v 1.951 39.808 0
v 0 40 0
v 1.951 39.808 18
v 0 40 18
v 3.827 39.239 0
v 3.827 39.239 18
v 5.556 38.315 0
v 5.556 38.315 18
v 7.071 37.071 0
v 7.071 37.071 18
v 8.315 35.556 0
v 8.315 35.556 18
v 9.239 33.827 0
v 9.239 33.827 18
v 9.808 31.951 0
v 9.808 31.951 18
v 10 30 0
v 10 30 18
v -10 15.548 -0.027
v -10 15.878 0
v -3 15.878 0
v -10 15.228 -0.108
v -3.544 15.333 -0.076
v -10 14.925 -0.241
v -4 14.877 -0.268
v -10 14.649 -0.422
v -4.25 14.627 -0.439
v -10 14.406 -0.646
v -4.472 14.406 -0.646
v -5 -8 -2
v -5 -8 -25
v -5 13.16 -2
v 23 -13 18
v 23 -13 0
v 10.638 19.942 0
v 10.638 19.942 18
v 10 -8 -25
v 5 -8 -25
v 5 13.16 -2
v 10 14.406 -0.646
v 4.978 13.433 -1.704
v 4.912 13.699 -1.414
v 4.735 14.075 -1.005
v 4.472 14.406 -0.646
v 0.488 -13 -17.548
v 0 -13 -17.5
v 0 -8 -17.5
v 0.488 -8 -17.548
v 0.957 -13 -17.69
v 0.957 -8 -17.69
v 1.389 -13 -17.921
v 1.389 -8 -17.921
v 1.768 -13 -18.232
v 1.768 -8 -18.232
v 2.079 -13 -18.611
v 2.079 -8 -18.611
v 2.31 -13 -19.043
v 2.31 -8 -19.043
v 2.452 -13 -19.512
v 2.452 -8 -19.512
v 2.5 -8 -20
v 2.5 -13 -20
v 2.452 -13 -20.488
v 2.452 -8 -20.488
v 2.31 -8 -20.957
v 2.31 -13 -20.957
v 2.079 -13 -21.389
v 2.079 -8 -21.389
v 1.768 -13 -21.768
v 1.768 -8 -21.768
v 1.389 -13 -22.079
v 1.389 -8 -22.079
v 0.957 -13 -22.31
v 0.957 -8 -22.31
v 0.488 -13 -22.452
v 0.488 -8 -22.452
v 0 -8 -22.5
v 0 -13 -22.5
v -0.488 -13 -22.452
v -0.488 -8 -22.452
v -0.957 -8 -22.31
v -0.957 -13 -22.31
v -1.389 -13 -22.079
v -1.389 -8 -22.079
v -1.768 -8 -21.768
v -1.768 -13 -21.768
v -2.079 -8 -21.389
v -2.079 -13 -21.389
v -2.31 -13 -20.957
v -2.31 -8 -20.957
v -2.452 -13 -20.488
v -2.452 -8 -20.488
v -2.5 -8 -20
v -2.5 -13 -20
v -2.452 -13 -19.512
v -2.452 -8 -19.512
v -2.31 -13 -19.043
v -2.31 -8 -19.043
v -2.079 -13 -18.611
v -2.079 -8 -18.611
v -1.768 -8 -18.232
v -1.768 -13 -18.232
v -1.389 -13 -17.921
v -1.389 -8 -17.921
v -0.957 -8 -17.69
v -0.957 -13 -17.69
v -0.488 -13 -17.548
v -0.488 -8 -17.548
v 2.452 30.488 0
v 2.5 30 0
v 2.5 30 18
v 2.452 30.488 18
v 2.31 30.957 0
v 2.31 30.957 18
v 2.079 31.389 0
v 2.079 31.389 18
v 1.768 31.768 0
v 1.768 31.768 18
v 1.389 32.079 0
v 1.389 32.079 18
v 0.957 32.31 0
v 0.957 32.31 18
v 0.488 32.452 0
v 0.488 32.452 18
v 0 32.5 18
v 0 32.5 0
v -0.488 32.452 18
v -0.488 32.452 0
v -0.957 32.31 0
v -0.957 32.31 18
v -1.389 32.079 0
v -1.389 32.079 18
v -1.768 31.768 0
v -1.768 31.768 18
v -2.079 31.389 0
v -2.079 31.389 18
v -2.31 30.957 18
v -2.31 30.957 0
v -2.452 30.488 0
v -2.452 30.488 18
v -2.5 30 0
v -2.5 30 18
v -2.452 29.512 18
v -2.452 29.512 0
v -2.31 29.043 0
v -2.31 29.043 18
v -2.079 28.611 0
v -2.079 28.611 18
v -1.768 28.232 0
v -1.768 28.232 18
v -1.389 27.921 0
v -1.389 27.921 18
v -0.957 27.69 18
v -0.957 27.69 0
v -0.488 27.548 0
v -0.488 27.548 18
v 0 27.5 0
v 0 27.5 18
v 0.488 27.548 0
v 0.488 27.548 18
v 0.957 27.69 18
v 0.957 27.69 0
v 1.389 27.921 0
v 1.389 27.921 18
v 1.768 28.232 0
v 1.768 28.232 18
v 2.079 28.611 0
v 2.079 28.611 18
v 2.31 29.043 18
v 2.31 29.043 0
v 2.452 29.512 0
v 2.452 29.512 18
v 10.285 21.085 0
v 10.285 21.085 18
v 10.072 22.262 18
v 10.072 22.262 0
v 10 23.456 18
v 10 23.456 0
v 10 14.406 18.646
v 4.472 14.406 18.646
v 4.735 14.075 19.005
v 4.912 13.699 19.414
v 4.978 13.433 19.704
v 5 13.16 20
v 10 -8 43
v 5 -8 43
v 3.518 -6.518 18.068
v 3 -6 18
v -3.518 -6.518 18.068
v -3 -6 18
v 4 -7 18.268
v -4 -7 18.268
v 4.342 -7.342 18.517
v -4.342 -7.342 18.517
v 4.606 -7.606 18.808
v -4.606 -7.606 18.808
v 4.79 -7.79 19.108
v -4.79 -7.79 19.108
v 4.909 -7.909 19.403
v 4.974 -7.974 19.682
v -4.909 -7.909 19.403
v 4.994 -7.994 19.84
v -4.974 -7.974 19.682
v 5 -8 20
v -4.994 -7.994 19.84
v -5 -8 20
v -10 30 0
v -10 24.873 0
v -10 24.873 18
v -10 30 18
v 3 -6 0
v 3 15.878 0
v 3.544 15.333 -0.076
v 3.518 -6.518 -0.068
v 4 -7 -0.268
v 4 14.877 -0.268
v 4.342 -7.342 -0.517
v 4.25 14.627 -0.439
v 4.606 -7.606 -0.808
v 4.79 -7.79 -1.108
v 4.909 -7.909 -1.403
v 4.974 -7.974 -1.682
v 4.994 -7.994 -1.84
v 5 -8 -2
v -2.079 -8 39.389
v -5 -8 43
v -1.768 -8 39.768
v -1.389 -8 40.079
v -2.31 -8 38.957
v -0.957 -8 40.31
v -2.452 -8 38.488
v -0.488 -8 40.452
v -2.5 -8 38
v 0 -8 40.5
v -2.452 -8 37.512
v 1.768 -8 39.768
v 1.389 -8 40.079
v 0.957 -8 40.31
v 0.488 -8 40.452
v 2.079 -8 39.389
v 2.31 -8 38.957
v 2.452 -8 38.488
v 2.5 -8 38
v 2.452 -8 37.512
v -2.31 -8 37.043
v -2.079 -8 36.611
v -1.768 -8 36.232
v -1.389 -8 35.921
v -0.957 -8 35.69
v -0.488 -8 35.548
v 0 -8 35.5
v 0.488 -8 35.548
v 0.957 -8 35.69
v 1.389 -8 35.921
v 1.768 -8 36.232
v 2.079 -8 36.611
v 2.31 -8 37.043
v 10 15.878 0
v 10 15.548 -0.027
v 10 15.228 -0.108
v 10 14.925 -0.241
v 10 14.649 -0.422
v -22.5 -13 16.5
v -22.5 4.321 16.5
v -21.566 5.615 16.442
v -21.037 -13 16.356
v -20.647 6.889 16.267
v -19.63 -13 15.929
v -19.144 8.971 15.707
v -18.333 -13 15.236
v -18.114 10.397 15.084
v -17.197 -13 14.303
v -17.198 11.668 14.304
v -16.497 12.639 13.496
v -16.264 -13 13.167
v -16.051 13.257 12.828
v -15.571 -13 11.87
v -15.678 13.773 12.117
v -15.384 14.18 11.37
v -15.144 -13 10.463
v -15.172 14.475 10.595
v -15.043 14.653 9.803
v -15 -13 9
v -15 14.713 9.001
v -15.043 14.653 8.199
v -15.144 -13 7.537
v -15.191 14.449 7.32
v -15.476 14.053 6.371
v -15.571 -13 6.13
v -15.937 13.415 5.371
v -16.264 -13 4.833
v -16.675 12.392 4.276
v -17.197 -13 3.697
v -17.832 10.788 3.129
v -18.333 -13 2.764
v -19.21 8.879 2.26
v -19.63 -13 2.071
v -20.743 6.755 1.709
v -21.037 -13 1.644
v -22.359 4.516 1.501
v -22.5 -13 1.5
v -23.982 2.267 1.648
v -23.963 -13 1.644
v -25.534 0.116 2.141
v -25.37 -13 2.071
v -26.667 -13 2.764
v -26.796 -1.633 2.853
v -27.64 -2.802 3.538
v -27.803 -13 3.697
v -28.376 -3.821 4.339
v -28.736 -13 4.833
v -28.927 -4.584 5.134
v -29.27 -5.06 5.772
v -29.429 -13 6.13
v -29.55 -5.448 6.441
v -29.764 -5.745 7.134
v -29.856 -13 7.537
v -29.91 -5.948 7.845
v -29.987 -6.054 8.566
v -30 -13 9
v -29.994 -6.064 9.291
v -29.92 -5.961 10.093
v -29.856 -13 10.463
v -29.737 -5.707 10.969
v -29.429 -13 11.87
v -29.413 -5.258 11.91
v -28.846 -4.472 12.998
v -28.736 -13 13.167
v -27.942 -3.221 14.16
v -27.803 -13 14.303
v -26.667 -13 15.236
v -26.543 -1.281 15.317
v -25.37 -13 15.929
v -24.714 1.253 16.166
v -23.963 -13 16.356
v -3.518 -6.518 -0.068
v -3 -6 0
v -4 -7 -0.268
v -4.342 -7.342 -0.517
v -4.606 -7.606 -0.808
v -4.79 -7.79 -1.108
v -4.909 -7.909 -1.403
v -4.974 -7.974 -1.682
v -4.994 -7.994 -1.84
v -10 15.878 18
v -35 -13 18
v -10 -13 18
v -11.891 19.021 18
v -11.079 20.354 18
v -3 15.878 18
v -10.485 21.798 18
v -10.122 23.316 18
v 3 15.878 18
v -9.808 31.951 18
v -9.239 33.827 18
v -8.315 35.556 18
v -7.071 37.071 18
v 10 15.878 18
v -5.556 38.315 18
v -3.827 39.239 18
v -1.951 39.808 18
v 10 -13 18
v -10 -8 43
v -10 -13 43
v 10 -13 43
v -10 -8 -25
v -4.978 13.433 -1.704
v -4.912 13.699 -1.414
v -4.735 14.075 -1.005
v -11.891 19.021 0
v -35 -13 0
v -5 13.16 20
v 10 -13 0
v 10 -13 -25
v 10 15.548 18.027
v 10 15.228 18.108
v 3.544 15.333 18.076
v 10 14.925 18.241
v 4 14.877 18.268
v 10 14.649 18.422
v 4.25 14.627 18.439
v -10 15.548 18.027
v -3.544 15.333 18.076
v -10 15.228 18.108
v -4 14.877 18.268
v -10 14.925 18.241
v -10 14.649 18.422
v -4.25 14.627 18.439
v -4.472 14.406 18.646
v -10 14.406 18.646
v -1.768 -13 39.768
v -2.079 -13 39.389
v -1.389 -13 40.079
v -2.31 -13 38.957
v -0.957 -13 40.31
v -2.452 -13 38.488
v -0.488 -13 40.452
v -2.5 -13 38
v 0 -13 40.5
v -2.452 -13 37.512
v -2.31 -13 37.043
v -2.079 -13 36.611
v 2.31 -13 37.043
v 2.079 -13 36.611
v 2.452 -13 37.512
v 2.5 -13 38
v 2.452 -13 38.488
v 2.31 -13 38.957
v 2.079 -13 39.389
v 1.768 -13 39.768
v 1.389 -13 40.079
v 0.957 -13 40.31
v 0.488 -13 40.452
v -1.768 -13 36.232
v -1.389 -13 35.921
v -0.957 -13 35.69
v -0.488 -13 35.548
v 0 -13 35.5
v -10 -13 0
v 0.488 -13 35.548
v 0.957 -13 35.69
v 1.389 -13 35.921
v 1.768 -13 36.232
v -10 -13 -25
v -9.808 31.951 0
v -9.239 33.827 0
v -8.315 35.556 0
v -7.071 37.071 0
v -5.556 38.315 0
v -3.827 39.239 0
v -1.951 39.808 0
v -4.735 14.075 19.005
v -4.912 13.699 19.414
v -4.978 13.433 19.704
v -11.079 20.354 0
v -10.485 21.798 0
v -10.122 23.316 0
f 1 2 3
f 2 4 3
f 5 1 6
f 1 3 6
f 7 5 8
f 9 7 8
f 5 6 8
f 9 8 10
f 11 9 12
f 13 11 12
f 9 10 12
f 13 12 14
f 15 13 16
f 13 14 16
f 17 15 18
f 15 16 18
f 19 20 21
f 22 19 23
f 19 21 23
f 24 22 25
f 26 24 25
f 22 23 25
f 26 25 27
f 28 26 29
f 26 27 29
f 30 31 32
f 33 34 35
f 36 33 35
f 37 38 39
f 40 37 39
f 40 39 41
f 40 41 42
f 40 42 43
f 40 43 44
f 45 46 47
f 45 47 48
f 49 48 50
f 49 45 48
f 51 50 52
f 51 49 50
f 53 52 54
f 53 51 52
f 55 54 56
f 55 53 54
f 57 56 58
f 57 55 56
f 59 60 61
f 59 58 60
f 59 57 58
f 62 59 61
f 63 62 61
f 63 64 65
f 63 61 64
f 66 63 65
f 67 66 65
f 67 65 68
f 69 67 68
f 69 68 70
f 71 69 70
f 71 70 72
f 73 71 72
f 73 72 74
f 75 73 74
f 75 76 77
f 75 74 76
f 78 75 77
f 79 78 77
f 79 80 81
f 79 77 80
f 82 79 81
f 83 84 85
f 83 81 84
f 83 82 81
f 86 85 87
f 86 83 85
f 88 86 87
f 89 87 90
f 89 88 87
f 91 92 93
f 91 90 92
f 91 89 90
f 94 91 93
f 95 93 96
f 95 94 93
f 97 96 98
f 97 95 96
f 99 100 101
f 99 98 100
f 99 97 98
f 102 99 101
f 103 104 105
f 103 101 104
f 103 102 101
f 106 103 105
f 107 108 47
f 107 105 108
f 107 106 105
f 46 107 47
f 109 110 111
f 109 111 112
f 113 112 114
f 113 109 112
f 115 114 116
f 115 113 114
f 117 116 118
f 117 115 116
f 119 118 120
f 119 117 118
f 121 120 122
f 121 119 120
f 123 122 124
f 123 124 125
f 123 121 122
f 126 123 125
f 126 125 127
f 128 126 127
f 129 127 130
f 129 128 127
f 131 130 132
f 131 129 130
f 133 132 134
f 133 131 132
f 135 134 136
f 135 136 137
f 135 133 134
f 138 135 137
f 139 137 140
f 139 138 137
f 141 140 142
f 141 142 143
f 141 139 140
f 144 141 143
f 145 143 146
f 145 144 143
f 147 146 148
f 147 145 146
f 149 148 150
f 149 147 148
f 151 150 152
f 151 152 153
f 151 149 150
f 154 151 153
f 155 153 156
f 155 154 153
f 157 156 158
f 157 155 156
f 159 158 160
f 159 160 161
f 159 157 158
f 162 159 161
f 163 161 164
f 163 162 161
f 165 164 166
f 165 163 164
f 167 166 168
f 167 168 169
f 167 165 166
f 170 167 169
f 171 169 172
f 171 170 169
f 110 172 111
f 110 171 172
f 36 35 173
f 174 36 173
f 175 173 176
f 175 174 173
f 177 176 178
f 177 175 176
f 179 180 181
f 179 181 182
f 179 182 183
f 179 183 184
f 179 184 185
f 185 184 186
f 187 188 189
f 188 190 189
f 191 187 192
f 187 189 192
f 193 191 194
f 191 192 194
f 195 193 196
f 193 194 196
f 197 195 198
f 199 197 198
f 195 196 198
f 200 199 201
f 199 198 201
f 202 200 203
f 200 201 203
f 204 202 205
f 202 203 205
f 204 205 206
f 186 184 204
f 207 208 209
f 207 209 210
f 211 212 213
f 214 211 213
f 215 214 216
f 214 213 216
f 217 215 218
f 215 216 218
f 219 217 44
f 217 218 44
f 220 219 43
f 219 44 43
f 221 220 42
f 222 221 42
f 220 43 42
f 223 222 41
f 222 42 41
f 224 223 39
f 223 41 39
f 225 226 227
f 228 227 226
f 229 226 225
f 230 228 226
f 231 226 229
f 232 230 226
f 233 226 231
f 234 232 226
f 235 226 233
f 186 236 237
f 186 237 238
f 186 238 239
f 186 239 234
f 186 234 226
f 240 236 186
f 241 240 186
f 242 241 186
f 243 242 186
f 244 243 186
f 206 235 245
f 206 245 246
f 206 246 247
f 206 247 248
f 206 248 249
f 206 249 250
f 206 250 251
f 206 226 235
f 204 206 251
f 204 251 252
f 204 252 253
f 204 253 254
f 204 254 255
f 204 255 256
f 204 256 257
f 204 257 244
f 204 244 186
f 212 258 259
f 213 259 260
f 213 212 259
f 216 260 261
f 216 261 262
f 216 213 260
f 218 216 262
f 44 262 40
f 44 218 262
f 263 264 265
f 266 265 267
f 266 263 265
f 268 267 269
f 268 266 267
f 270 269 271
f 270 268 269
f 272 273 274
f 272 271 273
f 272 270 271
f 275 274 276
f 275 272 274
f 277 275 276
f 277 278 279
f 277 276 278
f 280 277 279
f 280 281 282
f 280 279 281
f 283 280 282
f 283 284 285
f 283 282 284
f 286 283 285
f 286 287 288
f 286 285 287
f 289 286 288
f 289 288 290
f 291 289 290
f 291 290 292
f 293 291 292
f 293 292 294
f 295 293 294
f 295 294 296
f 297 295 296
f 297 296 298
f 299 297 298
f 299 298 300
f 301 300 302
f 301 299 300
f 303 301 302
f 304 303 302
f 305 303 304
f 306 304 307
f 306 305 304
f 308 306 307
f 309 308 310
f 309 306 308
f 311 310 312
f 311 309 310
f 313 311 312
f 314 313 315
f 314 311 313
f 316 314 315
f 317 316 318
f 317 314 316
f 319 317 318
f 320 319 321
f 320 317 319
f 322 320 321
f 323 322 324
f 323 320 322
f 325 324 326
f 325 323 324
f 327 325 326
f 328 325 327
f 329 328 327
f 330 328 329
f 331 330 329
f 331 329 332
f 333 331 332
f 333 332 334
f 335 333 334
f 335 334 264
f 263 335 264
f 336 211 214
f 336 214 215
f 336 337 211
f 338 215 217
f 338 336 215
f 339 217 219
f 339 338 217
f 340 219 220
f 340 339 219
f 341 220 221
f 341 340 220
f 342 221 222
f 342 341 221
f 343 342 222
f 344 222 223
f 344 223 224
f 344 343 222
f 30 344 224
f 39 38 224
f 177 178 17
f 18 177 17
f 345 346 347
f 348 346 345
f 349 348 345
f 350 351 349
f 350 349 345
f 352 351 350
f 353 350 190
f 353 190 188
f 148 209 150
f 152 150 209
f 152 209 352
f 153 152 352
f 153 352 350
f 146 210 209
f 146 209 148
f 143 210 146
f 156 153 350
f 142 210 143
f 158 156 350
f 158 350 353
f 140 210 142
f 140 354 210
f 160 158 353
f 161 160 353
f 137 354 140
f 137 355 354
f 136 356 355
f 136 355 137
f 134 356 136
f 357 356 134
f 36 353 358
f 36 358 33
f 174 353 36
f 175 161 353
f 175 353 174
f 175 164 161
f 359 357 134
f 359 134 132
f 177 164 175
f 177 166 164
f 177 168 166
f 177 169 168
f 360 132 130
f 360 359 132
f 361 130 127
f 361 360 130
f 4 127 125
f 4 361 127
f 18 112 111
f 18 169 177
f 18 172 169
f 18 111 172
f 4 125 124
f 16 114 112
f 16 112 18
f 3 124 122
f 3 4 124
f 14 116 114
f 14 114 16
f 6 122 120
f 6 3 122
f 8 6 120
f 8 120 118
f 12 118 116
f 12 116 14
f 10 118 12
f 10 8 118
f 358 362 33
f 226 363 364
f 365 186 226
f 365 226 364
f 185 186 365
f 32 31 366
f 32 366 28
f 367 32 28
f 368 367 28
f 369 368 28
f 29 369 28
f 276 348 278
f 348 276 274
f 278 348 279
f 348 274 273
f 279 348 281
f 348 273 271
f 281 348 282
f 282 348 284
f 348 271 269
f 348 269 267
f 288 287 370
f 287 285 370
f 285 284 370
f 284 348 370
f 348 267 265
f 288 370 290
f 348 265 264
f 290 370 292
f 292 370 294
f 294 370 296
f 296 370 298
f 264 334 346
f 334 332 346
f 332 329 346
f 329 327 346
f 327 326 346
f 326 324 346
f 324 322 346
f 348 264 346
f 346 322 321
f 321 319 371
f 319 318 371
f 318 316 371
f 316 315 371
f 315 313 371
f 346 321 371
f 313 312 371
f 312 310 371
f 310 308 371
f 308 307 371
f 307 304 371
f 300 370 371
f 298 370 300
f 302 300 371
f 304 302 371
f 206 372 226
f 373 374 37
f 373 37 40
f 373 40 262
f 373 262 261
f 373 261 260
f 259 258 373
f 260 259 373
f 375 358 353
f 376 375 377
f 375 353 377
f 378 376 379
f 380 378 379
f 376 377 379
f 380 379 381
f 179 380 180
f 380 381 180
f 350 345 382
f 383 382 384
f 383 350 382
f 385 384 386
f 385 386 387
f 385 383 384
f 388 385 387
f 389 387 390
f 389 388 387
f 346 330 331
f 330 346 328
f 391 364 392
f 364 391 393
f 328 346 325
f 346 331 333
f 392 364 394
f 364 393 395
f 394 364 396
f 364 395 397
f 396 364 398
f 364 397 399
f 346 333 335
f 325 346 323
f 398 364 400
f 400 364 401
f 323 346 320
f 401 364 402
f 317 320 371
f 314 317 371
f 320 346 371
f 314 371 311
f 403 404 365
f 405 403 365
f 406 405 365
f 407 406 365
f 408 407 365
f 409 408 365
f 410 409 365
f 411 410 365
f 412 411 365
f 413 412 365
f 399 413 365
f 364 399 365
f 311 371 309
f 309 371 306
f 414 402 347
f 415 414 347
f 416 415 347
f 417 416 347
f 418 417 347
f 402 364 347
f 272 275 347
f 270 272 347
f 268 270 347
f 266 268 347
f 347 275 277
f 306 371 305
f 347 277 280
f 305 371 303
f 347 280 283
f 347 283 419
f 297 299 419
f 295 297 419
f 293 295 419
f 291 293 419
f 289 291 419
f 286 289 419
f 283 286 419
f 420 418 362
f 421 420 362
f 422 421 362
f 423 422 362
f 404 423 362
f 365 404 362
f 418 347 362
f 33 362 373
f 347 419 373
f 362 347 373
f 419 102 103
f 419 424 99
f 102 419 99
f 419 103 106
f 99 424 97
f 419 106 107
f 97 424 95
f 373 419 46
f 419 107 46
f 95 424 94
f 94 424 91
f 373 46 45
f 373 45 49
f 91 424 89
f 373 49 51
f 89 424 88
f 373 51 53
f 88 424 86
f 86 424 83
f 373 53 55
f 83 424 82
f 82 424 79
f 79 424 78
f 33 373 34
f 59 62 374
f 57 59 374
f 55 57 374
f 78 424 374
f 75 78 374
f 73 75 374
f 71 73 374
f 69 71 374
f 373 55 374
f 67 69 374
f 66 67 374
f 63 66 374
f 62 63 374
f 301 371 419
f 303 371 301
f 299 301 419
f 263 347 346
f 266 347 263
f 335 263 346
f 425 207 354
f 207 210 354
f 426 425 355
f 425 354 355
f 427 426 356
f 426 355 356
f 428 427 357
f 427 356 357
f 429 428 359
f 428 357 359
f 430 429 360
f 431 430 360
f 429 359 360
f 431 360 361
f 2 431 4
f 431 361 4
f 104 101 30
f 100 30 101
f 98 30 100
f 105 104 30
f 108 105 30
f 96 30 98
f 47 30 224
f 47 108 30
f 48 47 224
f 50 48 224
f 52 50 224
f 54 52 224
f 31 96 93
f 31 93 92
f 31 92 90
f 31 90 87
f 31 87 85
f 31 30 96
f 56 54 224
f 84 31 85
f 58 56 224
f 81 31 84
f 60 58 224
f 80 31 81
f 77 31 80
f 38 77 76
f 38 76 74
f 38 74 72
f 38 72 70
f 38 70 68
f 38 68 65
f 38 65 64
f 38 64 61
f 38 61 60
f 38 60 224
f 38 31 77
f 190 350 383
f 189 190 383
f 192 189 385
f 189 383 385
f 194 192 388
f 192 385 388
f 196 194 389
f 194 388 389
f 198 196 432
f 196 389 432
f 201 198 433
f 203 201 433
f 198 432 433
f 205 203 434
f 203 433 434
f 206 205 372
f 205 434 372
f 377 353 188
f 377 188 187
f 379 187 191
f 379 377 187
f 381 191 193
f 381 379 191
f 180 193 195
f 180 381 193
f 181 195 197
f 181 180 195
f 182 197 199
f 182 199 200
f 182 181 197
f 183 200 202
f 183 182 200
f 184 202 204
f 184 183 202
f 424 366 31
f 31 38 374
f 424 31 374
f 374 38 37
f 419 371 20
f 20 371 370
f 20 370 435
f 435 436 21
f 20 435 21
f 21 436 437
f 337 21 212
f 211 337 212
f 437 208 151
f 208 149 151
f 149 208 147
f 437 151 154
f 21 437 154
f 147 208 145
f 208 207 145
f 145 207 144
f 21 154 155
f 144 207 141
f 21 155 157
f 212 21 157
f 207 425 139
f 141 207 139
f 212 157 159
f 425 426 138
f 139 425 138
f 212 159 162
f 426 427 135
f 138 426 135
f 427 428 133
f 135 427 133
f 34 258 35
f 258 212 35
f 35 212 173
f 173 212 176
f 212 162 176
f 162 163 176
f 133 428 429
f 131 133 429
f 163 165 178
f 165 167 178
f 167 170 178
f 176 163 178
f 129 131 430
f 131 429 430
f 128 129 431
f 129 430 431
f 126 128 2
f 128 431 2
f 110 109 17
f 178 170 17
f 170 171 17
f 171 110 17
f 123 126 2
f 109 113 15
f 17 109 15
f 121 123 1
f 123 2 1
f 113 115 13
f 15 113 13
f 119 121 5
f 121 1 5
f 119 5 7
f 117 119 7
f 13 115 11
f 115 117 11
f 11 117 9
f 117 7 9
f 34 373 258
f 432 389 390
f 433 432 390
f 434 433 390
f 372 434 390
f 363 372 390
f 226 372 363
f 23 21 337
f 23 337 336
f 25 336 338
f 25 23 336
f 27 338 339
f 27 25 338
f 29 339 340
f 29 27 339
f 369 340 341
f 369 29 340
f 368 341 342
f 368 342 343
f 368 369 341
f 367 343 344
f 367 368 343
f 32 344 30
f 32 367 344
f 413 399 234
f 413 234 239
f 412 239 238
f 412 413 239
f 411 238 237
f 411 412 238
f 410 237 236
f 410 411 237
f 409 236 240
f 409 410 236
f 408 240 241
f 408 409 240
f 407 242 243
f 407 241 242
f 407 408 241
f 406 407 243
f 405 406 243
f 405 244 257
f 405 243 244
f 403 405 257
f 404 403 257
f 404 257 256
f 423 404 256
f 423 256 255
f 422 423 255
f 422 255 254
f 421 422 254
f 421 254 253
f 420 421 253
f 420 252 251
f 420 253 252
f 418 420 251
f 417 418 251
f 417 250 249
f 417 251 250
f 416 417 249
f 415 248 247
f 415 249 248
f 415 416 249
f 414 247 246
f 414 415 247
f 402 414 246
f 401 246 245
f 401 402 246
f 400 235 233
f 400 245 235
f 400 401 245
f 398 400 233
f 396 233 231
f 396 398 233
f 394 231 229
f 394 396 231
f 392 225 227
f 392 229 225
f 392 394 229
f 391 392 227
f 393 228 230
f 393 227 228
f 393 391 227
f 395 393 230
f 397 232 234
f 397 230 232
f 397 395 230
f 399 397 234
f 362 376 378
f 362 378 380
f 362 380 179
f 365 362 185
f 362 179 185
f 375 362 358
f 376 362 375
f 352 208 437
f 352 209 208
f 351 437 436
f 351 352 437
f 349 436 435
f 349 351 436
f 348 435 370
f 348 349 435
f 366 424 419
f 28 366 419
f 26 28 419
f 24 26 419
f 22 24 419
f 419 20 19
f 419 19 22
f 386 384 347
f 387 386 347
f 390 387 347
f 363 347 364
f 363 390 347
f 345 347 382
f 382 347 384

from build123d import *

# Parameters (mm, degrees)
SKETCH1_W                = 20
SKETCH1_H                = 53
SKETCH1_R                = 2.5
BOSS_EXTRUDE1_DEPTH      = 18
FILLET1_R                = 10
BOSS_EXTRUDE2_DEPTH      = 18
BOSS_EXTRUDE3_DEPTH      = 43
BOSS_EXTRUDE3_DEPTH_BACK = 25
SKETCH3_W                = 20
SKETCH3_H                = 5
RIB8_REACH               = 69.365
SKETCH6_WALL_W           = 170.699933848
SKETCH6_WALL_H           = 5
RIB9_REACH               = 69.365
SKETCH7_WALL_W           = 170.699933848
SKETCH7_WALL_H           = 5
CUT_EXTRUDE1_DEPTH       = 69.366658541
CUT_EXTRUDE1_DEPTH_BACK  = 69.366658541
SKETCH8_R                = 2.5
SKETCH8_R_2              = 7.5
FILLET3_R                = 10
FILLET4_R                = 2


with BuildPart() as part:
    # Sketch1 → Boss-Extrude1 (new body)
    with BuildSketch(Plane.XY):
        with Locations((0, 13.5)):
            Rectangle(SKETCH1_W, SKETCH1_H)
        with Locations((0, 30)):
            Circle(SKETCH1_R, mode=Mode.SUBTRACT)
    extrude(amount=BOSS_EXTRUDE1_DEPTH)

    # Fillet1
    fillet1_edges = [part.edges().sort_by_distance(p)[0] for p in [
        (-10, 40, 9),
        (10, 40, 9),
    ]]
    fillet(fillet1_edges, radius=FILLET1_R - 0.0001)  # a hair under: the kernel refuses the full size

    # Sketch2 → Boss-Extrude2 (add)
    with BuildSketch(Plane.XY):
        Polygon((-10, 21.641016151), (-35, -13), (-10, -13), align=None)
        Polygon((10, 21.641016151), (10, -13), (23, -13), align=None)
    extrude(amount=BOSS_EXTRUDE2_DEPTH)

    # Sketch3 → Boss-Extrude3 (add, two sides: drawn at the far end of the back side and taken through both)
    with BuildSketch(Plane.XY.offset(-BOSS_EXTRUDE3_DEPTH_BACK)):
        with Locations((0, -10.5)):
            Rectangle(SKETCH3_W, SKETCH3_H)
    extrude(amount=BOSS_EXTRUDE3_DEPTH + BOSS_EXTRUDE3_DEPTH_BACK)

    # Sketch6 wall → Rib8 (add, up to next)
    with BuildSketch(Plane(origin=(-10, 3.5, -12.5), x_dir=(0, 0.677056530821, 0.735931011762), z_dir=(0, 0.735931011762, -0.677056530821)), mode=Mode.PRIVATE) as rib8_sk1:
        with Locations((0, 2.5)):
            Rectangle(SKETCH6_WALL_W, SKETCH6_WALL_H)
    rib8_tool1 = extrude(rib8_sk1.sketch, amount=-RIB8_REACH, mode=Mode.PRIVATE) - part.part
    rib8 = rib8_tool1.solids().sort_by_distance((-10, 3.5, -12.5))[0]
    add(rib8)

    # Sketch7 wall → Rib9 (add, up to next)
    with BuildSketch(Plane(origin=(-10, 3.5, 30.5), x_dir=(0, -0.677056530821, 0.735931011762), z_dir=(0, 0.735931011762, 0.677056530821)), mode=Mode.PRIVATE) as rib9_sk1:
        with Locations((0, 2.5)):
            Rectangle(SKETCH7_WALL_W, SKETCH7_WALL_H)
    rib9_tool1 = extrude(rib9_sk1.sketch, amount=-RIB9_REACH, mode=Mode.PRIVATE) - part.part
    rib9 = rib9_tool1.solids().sort_by_distance((-10, 3.5, 30.5))[0]
    add(rib9)

    # Mirror1: Rib8, Rib9 across plane
    add(rib8.mirror(Plane(origin=(0, 0, 0), x_dir=(0, 0, 1), z_dir=(1, 0, 0))))
    add(rib9.mirror(Plane(origin=(0, 0, 0), x_dir=(0, 0, 1), z_dir=(1, 0, 0))))

    # Sketch8 → Cut-Extrude1 (cut, two sides: drawn at the far end of the back side and taken through both)
    with BuildSketch(Plane(origin=(0, 0, 0), x_dir=(1, 0, 0), z_dir=(0, 1, 0)).offset(-CUT_EXTRUDE1_DEPTH_BACK)):
        with Locations(Location((0, 20, 0), (0, 0, 270))):
            Circle(SKETCH8_R)
        with Locations(Location((0, -38, 0), (0, 0, 270))):
            Circle(SKETCH8_R)
        with Locations(Location((-22.5, -9, 0), (0, 0, 270))):
            Circle(SKETCH8_R_2)
    extrude(amount=CUT_EXTRUDE1_DEPTH + CUT_EXTRUDE1_DEPTH_BACK, mode=Mode.SUBTRACT)

    # Fillet3
    fillet3_edges = [part.edges().sort_by_distance(p)[0] for p in [
        (-10, 21.641016151, 9),
        (10, 21.641016151, 9),
    ]]
    fillet(fillet3_edges, radius=FILLET3_R)

    # Fillet4
    fillet4_edges = [part.edges().sort_by_distance(p)[0] for p in [
        (-5, 3.5, 18),
        (-7.5, 15, 18),
        (0, -8, 0),
        (7.5, 15, 0),
        (5, 3.5, 0),
        (0, -8, 18),
        (5, 3.5, 18),
        (7.5, 15, 18),
        (-7.5, 15, 0),
        (-5, 3.5, 0),
    ]]
    fillet(fillet4_edges, radius=FILLET4_R)


solid = part.part
